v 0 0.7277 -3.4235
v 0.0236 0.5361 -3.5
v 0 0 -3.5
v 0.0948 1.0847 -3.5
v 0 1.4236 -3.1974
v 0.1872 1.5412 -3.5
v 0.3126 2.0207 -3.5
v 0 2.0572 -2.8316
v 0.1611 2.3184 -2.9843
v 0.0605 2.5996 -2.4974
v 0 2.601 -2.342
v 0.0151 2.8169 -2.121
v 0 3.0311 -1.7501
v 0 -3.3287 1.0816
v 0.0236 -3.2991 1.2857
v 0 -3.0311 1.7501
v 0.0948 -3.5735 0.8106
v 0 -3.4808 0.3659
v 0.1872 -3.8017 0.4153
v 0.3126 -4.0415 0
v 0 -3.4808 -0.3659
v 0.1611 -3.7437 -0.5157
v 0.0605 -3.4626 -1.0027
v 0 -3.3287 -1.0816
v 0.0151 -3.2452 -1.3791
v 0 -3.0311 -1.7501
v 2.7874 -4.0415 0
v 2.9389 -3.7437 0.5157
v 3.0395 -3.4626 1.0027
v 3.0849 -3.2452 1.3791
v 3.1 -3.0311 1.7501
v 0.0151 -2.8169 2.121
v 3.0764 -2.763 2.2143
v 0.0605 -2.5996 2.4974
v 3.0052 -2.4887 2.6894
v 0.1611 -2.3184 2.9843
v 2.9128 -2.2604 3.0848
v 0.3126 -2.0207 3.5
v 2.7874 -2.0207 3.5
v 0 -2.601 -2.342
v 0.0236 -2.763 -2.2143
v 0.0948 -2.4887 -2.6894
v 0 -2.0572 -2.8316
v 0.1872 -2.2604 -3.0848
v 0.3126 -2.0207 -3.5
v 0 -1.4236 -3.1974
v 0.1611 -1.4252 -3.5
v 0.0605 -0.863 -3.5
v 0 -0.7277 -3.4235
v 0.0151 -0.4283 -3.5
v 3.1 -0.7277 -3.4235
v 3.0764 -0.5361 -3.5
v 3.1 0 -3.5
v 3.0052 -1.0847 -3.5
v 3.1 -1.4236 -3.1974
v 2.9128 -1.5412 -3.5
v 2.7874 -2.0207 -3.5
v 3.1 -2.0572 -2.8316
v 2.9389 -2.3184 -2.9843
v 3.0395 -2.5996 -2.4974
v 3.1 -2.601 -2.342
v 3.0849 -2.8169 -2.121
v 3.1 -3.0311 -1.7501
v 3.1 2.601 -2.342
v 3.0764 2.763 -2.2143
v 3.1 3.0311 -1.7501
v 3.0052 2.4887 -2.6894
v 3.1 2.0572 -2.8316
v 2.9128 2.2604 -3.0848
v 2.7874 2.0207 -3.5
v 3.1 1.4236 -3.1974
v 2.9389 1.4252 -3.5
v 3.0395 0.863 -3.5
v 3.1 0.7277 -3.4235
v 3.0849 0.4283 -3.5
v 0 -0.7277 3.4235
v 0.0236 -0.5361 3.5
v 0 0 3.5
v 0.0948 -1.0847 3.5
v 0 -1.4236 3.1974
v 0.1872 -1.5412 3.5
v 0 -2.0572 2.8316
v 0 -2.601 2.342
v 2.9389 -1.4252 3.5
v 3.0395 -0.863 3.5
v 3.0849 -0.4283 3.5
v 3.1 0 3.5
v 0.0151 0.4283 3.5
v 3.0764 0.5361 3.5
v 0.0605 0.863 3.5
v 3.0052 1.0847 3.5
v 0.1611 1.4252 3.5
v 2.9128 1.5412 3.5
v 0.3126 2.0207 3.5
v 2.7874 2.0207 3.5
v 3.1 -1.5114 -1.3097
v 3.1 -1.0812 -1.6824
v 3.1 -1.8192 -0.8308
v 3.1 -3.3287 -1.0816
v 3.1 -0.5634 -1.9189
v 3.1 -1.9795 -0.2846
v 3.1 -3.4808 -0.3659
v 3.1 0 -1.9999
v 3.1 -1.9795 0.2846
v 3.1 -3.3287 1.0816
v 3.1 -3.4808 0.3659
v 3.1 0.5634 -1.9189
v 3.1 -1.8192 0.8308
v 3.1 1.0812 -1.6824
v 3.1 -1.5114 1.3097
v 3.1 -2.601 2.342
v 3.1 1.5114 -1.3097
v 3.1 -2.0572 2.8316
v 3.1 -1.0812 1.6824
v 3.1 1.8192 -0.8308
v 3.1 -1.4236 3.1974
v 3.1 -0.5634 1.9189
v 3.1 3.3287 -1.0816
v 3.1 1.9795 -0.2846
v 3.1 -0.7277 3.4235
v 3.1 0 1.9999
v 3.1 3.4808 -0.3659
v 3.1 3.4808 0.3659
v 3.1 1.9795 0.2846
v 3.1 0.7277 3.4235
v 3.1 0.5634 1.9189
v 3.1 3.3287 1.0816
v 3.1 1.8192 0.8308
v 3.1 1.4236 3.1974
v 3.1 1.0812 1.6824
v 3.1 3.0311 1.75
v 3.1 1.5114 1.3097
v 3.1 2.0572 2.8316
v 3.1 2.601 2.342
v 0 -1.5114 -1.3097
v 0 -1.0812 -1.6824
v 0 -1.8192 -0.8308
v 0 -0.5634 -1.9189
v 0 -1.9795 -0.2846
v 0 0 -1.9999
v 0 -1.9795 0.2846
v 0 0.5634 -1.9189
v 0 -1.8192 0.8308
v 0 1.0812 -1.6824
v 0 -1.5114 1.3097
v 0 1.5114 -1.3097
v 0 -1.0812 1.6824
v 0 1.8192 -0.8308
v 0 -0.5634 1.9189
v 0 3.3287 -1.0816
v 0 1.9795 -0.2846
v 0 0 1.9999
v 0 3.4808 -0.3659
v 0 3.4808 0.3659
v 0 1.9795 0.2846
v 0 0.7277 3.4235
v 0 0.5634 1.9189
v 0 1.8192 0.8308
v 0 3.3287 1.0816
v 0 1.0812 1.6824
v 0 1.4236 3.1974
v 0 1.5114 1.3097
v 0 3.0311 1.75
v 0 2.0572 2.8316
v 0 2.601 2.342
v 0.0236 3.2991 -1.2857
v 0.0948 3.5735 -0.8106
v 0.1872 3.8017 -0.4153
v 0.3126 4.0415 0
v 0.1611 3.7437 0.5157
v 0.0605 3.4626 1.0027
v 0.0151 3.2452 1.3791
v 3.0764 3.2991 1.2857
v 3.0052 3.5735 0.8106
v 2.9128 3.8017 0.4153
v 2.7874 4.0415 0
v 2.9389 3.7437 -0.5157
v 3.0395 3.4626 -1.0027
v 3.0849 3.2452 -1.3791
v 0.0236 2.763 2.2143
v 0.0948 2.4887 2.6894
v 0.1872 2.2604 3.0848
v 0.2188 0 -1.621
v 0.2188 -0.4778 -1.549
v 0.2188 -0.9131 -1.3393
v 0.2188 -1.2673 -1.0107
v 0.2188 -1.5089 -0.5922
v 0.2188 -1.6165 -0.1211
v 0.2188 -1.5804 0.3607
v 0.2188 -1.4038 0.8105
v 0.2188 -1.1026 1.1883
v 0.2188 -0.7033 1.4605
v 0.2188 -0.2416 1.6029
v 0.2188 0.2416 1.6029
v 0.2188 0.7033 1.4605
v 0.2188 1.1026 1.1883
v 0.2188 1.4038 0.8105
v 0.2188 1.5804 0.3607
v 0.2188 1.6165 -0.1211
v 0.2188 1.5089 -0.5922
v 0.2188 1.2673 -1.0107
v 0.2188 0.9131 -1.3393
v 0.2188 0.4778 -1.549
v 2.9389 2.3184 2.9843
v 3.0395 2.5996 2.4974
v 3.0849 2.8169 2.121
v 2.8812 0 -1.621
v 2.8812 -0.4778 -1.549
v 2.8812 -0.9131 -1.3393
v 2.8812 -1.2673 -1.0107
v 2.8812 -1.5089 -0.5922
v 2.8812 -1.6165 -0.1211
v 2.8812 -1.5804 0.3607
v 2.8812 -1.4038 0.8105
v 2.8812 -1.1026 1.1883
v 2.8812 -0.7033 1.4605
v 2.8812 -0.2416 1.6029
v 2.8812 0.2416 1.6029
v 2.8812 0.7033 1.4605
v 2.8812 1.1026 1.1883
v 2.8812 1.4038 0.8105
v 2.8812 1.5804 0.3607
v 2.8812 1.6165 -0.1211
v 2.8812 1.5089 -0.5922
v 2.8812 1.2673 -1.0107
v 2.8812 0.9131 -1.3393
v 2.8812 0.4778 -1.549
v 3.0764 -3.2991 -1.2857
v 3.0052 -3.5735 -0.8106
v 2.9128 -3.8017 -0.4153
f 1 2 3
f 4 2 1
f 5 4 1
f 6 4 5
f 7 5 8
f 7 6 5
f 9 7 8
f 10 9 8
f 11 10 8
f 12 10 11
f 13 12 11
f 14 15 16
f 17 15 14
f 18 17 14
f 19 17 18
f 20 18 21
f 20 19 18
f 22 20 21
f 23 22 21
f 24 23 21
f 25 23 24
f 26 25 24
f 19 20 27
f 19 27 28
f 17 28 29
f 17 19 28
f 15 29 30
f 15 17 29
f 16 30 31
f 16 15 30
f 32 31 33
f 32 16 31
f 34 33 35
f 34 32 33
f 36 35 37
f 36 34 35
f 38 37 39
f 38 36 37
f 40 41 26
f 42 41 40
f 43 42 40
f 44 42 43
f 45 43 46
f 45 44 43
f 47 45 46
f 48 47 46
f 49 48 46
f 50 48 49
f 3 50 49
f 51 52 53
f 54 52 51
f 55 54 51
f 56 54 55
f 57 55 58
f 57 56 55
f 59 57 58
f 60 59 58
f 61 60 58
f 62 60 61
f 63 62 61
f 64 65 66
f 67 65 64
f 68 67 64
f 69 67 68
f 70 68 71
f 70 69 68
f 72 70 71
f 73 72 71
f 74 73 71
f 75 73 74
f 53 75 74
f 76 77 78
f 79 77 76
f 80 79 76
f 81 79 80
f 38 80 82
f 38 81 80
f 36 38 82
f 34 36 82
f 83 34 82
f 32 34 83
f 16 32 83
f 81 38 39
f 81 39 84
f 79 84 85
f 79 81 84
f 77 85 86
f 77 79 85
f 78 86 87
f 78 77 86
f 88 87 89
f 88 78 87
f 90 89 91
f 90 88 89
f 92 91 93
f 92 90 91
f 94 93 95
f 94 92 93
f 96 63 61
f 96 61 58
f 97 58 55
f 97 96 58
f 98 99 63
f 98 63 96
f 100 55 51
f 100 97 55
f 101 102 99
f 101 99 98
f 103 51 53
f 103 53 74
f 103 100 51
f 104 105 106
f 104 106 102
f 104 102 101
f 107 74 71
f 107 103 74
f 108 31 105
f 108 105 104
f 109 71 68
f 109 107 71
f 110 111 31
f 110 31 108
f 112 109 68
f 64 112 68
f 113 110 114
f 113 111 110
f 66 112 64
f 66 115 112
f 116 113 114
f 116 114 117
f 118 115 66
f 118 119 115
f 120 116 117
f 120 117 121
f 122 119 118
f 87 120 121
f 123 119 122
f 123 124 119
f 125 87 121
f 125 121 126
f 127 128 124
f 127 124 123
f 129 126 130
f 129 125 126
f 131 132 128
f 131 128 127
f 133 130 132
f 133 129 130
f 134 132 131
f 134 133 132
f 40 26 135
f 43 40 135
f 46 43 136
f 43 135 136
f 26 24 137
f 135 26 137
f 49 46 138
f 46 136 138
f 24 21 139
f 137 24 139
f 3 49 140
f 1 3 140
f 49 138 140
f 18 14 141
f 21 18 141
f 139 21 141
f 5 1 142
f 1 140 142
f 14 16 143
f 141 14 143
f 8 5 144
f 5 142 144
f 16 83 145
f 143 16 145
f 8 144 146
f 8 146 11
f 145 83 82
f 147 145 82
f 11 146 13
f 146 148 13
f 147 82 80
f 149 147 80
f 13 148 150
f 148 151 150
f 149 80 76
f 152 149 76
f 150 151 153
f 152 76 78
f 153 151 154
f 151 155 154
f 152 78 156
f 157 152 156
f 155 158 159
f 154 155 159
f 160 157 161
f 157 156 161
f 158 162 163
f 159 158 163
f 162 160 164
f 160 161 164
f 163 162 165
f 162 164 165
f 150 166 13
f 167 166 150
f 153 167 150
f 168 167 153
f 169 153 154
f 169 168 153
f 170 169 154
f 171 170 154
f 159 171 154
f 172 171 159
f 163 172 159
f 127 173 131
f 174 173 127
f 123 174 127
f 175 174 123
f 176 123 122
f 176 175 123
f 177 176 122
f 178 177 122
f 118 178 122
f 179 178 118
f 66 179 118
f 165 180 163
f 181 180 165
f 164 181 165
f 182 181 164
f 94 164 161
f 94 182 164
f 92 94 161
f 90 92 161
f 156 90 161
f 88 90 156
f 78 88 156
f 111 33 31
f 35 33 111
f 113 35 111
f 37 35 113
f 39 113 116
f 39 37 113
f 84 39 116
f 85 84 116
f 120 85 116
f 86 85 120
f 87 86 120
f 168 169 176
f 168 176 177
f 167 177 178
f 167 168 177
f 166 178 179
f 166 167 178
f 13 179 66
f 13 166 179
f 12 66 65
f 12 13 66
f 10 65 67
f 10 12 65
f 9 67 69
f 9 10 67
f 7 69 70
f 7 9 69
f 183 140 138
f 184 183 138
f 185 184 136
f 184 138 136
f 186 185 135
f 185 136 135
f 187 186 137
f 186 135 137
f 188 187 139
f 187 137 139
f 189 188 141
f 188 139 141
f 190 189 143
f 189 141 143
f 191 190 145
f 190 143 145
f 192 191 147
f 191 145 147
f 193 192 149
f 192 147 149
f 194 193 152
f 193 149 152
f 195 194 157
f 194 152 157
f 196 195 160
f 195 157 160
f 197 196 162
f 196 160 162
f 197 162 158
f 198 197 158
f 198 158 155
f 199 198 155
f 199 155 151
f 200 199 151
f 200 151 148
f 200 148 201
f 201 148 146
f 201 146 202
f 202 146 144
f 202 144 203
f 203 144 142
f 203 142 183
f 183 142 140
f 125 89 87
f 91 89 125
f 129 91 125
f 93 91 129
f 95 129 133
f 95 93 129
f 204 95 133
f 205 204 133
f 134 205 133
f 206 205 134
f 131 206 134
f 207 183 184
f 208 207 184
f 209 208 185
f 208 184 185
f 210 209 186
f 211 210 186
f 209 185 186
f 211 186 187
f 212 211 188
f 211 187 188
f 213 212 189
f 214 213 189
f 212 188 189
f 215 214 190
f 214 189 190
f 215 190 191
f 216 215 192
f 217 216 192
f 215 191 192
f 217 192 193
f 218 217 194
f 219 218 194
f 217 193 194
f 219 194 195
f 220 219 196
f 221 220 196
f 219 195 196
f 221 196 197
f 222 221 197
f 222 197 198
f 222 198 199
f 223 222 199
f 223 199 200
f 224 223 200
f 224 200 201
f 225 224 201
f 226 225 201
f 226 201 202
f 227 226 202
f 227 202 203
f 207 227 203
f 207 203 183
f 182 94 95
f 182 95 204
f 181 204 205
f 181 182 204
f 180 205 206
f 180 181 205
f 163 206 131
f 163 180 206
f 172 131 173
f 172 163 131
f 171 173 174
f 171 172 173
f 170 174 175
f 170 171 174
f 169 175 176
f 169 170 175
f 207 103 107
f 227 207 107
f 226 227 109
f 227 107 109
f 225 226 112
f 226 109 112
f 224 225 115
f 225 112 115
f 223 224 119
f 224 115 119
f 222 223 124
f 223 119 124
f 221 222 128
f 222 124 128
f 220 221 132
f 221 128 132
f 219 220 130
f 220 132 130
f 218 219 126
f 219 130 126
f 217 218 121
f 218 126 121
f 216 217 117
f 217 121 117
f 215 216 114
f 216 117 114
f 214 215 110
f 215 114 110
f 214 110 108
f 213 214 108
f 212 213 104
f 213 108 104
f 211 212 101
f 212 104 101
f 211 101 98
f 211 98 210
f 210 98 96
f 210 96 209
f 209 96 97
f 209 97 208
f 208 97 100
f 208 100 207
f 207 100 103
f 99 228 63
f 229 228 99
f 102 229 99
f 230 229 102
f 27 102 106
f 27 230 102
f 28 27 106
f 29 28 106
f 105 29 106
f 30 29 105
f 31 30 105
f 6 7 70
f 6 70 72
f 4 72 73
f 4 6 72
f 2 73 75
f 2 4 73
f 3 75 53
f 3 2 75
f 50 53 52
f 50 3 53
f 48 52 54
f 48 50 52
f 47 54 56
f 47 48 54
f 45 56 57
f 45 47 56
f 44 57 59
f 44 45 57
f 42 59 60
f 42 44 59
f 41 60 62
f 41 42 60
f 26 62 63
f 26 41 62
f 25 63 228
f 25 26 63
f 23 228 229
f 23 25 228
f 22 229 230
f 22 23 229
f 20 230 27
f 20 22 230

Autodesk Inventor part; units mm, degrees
ref_plane "YZ Plane" through (0, 0, 0) normal (1, 0, 0) x (0, 1, 0)
ref_plane "XZ Plane" through (0, 0, 0) normal (0, 1, 0) x (-1, 0, 0)
ref_plane "XY Plane" through (0, 0, 0) normal (0, 0, 1) x (1, 0, 0)
sketch "Sketch1" plane through (0, 0, 0) normal (1, 0, 0) x (0, 1, 0)
  line L0 (-4.0415, 0) -> (-2.0207, 3.5)
  line L1 (-2.0207, 3.5) -> (2.0207, 3.5)
  line L2 (2.0207, 3.5) -> (4.0415, 0)
  line L3 (4.0415, 0) -> (2.0207, -3.5)
  line L4 (2.0207, -3.5) -> (-2.0207, -3.5)
  line L5 (-2.0207, -3.5) -> (-4.0415, 0)
  point P0 (0, 0)
  point P1 (0, 0)
  dimension "d0" = 8.0829
extrude "Body" add sketch "Sketch1" along normal blind 3.1
sketch "Sketch2" plane through (0, 0, 0) normal (0, 0, 1) x (1, 0, 0)
  line L0 (0, 2.0207) -> (0, 4.0415) projected
  line L1 (0, 4.0415) -> (3.1, 4.0415) projected
  line L2 (3.1, 2.0207) -> (3.1, 4.0415) projected
  line L3 (-0.62, 0) -> (3.72, 0) projected
  line L4 (0.3126, 4.0415) -> (0, 3.5)
  line L5 (2.7874, 4.0415) -> (3.1, 3.5)
  dimension "d3" = 30
  dimension "d4" = 30
  dimension "d5" = 7
  dimension "d6" = 7
revolve "Chamfer1" cut sketch "Sketch2" angle 360 about axis through (-10, 0, 0) along (1, 0, 0)
sketch "Sketch3" plane through (3.1, 0, 0) normal (1, 0, 0) x (0, 0, -1)
  arc A0 (-1.75, -3.0311) -> (1.75, -3.0311) centre (0, 0) ccw projected
hole "Thread" at (3.1, 0, 0) direction (-1, 0, 0) diameter 3.242 end through all thread size "M4x0.7" class "6H" standard "ANSI Metric M Profile"
chamfer "Chamfer2" distance 0.3789 angle 30 1 edges at (3.1, 0, 1.621) measured on face at (3.1, 2.8569, -0.0651)
chamfer "Chamfer3" distance 0.3789 angle 30 1 edges at (0, 0, 1.621) measured on face at (0, 2.8569, -0.0651)
equation "\"d0\" = 1.1547 * SW"
equation "\"d8\" = -0.5 * GD1 + 0.5 * NND"
equation "\"d40\" = -0.5 * GD1 + 0.5 * NND"
equation "\"d10\" = -0.5 * GD1 + 0.5 * NND"
equation "\"d41\" = -0.5 * GD1 + 0.5 * NND"
equation "\"d3\" = ANG1"
equation "\"d4\" = ANG2"
equation "\"d5\" = SW0"
equation "\"d6\" = SW01"
equation "\"ANG1\" = 30deg"
equation "\"ANG2\" = 30deg"
equation "\"NND\" = 4"
equation "\"KOH\" = 3.8"
equation "\"SW\" = 7"
equation "\"SW0\" = SW"
equation "\"SW01\" = SW"
equation "\"E0\" = 1.155 * SW"
equation "\"THREADDIA\" = 4"
equation "\"TPU\" = 0.7"
equation "\"GUL\" = 0.541266 * TPU"
equation "\"GAL\" = 0.541266 * TPU"
equation "\"PTC\" = TPU"
equation "\"TOA\" = 30deg"
equation "\"GD1\" = 3.242228"
properties part number "NUT, HEX, M4" material "Steel, MS"
